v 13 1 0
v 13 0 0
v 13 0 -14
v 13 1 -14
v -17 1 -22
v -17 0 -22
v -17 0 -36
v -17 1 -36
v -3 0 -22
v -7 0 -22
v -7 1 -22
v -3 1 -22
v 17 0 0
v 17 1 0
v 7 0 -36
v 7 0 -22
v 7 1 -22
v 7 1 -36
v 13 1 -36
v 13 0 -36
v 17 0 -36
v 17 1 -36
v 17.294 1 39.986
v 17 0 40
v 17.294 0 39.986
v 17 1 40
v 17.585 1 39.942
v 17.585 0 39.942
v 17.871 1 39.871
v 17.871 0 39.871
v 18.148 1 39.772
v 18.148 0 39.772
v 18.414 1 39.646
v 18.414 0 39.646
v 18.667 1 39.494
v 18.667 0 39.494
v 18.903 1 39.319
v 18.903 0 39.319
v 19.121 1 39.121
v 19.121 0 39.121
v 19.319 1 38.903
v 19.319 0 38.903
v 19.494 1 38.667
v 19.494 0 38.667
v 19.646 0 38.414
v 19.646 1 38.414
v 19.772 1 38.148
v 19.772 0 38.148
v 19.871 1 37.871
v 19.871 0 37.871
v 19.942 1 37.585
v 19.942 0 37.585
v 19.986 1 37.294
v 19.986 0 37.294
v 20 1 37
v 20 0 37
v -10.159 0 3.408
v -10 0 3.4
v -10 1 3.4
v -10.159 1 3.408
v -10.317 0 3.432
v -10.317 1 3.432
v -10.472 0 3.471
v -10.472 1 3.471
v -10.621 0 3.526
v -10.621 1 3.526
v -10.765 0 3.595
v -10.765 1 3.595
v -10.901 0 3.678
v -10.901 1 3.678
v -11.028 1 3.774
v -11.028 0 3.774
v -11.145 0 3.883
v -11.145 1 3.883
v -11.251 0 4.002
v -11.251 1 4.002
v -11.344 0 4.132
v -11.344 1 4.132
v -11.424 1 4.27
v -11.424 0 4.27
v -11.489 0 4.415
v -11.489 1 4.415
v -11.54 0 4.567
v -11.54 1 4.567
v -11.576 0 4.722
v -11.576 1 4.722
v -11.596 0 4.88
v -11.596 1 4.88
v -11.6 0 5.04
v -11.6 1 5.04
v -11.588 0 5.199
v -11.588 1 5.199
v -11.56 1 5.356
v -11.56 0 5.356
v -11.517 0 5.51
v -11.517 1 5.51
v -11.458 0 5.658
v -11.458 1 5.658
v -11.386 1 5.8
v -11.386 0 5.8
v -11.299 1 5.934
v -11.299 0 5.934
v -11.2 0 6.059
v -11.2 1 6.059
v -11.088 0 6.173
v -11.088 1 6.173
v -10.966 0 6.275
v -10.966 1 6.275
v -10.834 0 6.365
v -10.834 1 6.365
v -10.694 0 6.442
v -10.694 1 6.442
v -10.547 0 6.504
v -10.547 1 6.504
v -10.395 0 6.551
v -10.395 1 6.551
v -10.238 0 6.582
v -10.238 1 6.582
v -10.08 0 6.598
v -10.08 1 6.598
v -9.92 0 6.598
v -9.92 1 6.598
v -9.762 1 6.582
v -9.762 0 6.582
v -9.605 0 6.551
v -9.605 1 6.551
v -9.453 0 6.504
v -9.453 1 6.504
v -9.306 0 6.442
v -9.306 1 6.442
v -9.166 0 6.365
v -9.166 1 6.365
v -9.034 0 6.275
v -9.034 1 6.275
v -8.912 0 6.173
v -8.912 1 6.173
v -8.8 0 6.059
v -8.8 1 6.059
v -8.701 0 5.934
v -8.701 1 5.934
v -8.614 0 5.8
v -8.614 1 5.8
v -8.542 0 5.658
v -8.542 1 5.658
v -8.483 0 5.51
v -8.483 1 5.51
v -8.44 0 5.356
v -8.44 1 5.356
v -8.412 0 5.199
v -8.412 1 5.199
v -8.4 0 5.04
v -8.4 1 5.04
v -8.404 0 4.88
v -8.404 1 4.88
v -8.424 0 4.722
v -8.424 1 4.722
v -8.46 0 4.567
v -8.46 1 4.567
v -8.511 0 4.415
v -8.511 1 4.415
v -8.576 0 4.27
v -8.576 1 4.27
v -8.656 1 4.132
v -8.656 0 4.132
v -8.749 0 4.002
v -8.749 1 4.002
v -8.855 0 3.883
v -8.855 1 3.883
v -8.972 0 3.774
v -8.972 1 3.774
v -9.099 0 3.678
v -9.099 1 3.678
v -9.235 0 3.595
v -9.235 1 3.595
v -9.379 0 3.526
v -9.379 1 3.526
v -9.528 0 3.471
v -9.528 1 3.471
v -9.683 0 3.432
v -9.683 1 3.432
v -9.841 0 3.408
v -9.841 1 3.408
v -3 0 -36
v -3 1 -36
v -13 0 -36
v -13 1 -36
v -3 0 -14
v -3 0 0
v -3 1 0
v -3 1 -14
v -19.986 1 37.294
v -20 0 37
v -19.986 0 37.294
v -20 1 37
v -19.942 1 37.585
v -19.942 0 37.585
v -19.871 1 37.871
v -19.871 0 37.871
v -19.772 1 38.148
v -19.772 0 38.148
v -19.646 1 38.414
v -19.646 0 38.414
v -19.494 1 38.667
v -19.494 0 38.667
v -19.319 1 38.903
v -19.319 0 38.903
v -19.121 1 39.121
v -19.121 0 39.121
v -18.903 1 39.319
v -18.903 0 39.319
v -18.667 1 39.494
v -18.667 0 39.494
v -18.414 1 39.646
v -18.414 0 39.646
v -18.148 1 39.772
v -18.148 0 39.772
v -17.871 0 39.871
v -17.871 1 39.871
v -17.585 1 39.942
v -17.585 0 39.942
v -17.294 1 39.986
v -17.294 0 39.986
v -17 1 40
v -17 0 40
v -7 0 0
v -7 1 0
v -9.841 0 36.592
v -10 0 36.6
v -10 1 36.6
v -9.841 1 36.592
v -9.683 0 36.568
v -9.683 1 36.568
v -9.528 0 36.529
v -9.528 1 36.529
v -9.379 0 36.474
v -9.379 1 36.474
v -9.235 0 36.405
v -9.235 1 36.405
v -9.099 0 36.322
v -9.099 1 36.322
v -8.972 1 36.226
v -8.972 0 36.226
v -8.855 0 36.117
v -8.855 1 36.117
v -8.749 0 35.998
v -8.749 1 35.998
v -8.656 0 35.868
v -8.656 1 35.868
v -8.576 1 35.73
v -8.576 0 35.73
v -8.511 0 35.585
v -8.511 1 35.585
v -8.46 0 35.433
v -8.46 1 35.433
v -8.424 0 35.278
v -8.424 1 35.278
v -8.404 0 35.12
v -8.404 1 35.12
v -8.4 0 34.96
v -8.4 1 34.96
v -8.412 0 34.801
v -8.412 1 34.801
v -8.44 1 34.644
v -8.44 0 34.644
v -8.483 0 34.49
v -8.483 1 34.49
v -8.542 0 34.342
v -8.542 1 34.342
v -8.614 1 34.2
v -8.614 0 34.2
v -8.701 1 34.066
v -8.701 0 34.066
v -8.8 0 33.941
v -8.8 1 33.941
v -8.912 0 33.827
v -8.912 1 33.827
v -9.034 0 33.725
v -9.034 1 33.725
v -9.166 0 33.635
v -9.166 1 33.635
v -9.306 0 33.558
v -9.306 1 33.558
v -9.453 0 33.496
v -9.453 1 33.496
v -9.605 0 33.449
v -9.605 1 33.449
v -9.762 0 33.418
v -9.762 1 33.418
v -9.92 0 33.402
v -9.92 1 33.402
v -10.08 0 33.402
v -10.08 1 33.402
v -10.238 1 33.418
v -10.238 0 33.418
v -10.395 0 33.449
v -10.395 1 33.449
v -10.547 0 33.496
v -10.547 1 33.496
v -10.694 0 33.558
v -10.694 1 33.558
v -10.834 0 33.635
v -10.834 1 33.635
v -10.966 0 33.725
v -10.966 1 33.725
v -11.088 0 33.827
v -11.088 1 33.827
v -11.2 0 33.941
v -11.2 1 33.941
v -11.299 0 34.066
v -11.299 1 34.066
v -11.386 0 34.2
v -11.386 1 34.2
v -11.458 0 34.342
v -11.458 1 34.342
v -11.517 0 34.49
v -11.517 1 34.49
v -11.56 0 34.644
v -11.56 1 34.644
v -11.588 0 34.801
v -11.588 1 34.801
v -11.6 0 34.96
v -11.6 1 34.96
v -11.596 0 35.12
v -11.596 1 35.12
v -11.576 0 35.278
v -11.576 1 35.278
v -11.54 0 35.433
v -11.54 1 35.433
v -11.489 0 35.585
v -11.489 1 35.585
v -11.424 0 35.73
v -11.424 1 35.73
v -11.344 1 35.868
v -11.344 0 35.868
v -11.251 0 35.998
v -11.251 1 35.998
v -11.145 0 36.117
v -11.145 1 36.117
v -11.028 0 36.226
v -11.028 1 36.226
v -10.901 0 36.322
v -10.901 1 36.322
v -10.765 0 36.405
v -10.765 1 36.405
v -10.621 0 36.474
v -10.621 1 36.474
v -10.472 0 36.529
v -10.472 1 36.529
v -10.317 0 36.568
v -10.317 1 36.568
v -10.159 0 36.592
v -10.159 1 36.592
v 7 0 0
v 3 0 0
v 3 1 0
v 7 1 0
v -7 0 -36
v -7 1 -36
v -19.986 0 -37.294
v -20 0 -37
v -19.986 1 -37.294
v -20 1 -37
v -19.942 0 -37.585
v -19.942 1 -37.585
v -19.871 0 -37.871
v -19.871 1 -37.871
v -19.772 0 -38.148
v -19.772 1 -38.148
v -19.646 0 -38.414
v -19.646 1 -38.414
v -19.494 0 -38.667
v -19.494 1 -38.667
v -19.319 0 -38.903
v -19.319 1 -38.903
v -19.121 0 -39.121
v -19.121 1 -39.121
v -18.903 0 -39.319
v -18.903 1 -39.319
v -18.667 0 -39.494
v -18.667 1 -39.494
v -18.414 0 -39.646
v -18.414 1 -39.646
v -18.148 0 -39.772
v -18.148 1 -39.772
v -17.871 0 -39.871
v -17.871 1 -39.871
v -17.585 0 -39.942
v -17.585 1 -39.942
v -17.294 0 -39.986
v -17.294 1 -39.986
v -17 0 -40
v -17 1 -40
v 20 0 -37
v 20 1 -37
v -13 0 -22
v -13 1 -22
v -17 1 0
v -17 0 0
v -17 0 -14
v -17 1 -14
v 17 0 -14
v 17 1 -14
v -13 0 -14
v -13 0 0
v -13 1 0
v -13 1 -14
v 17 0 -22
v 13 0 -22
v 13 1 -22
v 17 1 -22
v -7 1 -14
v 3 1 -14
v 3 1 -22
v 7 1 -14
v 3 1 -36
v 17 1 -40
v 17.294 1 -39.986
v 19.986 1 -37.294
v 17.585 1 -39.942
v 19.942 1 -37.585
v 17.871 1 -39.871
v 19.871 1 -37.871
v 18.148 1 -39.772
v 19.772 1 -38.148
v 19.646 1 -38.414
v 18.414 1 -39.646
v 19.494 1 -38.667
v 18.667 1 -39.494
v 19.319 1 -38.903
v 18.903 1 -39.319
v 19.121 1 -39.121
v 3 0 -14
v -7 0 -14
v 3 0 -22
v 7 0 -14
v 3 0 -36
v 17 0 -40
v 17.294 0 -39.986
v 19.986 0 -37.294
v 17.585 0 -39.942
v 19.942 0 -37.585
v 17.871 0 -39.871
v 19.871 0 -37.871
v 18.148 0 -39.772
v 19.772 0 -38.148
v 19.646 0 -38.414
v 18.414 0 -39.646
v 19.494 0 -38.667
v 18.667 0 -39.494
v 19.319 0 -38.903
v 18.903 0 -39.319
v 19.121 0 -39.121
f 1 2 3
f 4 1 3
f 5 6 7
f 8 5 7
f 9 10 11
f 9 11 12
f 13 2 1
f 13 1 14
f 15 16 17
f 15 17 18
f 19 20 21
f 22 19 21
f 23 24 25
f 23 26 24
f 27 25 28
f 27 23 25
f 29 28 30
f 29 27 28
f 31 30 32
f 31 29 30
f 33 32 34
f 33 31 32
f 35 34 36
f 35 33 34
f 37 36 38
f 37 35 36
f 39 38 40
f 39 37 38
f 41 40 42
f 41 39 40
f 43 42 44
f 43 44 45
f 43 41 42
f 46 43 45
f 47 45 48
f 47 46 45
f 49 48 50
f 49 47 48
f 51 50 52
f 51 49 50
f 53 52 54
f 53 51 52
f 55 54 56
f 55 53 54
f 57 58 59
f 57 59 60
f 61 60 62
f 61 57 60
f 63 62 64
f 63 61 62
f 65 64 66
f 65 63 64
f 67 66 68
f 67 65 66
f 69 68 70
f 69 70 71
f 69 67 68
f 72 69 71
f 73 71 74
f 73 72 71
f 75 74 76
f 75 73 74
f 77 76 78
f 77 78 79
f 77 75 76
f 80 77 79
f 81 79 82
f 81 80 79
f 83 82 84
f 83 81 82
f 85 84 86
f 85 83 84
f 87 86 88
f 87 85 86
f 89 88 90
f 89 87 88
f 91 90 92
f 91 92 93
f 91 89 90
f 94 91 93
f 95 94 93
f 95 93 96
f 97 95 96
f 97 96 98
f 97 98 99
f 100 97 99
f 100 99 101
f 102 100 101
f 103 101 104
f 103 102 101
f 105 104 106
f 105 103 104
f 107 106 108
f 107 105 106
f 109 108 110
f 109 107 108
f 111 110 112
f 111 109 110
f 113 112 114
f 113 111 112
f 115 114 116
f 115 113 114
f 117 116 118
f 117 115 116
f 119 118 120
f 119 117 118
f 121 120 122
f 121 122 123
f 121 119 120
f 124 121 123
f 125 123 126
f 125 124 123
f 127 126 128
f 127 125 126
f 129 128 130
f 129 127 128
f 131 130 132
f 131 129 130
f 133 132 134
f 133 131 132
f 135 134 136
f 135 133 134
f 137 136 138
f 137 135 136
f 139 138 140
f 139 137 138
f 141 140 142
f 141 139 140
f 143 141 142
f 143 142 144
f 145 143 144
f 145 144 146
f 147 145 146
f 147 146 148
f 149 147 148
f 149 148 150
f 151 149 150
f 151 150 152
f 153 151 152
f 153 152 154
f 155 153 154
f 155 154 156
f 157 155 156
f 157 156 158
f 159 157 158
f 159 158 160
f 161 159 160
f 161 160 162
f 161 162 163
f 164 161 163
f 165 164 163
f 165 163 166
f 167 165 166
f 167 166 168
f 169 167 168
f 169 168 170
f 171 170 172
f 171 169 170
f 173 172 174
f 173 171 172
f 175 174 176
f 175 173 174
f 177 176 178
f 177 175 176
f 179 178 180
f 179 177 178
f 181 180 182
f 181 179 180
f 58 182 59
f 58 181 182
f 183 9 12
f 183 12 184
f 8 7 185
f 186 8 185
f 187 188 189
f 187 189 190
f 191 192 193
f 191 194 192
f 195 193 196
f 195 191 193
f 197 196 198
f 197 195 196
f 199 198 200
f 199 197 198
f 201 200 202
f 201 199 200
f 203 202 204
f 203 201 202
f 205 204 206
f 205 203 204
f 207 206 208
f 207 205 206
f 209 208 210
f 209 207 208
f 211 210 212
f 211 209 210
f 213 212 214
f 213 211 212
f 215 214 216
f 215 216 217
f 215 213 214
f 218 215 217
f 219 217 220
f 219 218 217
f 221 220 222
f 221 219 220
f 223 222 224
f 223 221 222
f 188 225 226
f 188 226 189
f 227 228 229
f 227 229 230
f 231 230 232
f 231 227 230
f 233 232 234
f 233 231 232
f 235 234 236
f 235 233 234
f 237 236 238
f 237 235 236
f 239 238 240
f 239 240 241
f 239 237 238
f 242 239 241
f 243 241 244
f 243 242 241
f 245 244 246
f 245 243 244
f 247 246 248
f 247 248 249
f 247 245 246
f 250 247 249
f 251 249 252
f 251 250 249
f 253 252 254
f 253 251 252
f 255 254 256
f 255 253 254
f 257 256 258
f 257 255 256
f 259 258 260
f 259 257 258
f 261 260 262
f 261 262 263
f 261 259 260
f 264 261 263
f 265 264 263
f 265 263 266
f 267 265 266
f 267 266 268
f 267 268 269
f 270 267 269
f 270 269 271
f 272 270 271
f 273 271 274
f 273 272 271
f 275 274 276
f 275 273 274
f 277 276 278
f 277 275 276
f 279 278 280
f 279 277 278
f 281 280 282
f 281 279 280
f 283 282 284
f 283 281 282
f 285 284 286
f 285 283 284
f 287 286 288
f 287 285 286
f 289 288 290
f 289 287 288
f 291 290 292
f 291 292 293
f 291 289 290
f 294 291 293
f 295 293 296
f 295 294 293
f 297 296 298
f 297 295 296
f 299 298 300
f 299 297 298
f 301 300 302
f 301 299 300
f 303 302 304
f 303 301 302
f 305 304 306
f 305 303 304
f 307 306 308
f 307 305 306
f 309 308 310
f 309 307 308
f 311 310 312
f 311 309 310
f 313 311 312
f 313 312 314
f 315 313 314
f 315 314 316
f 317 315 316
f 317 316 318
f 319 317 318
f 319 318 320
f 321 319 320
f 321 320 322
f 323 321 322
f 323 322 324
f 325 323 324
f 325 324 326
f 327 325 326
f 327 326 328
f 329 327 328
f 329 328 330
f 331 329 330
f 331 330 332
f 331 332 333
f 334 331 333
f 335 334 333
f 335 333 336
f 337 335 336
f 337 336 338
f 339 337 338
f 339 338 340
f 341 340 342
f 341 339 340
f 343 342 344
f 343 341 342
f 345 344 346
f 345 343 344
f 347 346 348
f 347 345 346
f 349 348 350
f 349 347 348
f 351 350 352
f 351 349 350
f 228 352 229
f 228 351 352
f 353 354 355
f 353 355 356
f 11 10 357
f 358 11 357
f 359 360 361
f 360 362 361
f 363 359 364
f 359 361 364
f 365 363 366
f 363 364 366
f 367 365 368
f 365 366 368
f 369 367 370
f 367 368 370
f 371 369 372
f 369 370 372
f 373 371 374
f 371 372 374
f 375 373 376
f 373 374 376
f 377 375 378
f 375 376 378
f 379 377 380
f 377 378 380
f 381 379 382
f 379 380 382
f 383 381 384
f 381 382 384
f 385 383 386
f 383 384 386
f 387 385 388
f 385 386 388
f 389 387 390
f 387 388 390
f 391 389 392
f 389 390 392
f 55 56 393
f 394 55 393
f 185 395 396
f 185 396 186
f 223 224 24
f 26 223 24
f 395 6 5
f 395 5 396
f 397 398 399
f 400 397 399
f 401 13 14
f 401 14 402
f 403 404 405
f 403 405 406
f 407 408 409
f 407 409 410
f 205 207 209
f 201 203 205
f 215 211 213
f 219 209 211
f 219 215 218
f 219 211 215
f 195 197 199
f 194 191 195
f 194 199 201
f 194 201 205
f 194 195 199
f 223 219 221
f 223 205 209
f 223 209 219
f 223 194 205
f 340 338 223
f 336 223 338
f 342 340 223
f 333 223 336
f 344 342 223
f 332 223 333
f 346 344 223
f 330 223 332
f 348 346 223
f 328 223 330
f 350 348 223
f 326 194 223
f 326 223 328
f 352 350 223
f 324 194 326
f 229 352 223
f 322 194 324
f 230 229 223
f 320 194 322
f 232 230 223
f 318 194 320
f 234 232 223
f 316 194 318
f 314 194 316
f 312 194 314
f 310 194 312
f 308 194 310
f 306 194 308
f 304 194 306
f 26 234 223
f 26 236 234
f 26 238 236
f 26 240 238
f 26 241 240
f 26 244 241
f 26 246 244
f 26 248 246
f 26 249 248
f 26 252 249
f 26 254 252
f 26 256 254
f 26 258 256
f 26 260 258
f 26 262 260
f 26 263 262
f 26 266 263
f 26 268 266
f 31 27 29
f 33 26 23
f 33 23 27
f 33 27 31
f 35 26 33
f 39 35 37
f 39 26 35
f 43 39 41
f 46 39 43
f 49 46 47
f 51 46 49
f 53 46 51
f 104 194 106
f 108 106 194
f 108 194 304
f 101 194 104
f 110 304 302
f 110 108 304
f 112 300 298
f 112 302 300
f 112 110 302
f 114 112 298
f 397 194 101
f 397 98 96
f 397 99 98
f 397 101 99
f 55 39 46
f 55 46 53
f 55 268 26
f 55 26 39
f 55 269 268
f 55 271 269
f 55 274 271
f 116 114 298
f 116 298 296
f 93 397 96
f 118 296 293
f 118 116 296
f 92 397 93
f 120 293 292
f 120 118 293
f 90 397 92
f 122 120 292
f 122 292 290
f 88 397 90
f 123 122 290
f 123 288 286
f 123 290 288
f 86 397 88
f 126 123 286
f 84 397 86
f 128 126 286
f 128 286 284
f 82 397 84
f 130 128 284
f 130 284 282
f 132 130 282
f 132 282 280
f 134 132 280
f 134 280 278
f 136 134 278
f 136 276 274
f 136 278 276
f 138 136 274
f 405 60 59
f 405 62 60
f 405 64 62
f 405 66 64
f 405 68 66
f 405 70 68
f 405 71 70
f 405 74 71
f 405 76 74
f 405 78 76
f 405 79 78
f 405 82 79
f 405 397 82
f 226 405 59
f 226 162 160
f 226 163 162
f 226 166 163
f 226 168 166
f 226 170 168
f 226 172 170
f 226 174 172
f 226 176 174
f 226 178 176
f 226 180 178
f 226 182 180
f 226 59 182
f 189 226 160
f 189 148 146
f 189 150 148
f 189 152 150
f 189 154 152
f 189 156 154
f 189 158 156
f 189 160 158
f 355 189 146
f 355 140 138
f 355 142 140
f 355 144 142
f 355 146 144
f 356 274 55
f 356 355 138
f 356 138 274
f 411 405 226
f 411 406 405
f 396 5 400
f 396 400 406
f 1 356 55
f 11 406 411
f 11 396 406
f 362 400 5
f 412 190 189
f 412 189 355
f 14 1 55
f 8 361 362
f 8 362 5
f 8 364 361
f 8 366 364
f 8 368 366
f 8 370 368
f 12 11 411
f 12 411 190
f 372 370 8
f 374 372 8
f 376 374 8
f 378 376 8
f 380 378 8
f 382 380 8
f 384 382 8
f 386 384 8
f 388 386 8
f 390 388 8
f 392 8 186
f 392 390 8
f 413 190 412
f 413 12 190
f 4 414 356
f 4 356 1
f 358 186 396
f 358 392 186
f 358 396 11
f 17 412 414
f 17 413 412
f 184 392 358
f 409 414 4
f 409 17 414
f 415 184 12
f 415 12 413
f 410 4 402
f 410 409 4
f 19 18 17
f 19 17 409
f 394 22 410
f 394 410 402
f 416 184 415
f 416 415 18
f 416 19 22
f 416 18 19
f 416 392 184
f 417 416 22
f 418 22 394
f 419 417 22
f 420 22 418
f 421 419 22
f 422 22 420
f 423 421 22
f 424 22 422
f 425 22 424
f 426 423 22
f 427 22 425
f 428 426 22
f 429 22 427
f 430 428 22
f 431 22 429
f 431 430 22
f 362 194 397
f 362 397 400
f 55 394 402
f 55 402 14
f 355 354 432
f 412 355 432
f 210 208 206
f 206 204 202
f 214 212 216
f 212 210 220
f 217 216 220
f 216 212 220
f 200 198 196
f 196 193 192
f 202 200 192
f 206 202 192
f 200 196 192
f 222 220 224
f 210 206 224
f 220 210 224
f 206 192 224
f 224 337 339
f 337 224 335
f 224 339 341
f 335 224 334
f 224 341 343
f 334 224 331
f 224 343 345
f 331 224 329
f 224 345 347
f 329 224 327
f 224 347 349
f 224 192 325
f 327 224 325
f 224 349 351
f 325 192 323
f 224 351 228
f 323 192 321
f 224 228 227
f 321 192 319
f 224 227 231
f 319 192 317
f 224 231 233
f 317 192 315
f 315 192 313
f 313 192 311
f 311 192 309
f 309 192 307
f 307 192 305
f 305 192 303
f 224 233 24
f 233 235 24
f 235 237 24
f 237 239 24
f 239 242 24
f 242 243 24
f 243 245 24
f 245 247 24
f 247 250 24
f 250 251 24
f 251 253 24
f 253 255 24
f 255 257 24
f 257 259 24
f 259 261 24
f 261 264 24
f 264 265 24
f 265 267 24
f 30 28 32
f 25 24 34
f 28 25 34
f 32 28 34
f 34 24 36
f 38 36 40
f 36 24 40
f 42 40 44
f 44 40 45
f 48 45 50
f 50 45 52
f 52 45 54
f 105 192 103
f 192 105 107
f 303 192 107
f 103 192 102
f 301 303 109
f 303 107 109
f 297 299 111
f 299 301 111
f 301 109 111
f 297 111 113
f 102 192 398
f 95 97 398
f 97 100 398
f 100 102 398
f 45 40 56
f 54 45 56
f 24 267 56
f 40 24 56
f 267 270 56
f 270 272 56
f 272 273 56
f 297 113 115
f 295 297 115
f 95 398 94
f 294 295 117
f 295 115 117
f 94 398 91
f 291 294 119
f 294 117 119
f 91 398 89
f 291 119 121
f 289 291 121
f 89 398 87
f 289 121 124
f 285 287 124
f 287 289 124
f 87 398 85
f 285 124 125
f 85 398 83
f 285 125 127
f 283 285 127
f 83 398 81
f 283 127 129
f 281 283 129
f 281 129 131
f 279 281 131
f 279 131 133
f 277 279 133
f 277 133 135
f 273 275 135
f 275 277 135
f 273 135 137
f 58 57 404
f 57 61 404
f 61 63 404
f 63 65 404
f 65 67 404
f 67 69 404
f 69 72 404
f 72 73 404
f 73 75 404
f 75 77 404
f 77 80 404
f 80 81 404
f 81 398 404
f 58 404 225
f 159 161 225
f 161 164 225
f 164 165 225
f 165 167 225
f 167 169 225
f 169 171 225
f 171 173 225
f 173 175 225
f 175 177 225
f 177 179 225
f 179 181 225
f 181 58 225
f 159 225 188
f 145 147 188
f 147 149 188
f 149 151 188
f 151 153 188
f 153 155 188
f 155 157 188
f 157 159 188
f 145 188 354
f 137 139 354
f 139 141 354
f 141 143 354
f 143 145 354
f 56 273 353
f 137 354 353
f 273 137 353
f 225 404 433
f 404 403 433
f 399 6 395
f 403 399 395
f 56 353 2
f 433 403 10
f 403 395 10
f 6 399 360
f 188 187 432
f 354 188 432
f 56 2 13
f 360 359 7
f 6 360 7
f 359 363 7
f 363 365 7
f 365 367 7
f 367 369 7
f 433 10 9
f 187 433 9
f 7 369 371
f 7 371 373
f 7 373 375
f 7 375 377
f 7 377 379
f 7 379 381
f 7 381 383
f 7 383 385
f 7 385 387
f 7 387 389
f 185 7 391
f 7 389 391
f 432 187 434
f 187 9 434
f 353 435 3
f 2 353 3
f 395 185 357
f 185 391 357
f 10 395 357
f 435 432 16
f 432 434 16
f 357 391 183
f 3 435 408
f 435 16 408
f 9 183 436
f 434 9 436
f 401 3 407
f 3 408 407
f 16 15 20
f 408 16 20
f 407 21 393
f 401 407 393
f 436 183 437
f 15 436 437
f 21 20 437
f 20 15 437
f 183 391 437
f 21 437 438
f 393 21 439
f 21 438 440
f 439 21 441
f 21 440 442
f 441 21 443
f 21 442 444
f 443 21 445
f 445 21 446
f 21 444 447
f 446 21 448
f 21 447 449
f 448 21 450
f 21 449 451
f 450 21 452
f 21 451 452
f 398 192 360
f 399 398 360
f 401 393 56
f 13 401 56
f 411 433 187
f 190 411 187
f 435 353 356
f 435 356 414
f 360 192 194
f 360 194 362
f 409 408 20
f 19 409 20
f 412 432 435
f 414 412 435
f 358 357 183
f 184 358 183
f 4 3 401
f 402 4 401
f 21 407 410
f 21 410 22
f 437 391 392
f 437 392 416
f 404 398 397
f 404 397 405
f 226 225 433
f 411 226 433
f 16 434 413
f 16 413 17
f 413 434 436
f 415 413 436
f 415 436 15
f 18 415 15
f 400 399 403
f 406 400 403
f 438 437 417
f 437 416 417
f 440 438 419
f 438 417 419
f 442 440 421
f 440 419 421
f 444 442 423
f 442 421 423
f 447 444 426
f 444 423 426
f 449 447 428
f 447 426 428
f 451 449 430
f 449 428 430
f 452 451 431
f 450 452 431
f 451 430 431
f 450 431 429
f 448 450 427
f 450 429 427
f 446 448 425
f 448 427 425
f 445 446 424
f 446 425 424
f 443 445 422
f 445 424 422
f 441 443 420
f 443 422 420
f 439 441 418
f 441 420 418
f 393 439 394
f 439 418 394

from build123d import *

# Parameters (mm, degrees)
SKETCH_1_W      = 40
SKETCH_1_H      = 80
SKETCH_1_R      = 1.6
SKETCH_1_W_2    = 4
SKETCH_1_H_2    = 14
EXTRUDE_1_DEPTH = 1
FILLET_1_R      = 3


with BuildPart() as part:
    # 草图1 → 凸台-拉伸1 (new body)
    with BuildSketch(Plane(origin=(0, 0, 0), x_dir=(1, 0, 0), z_dir=(0, 1, 0))):
        Rectangle(SKETCH_1_W, SKETCH_1_H)
        with Locations(Location((-10, -35, 0), (0, 0, 270))):
            Circle(SKETCH_1_R, mode=Mode.SUBTRACT)
        with Locations(Location((-10, -5, 0), (0, 0, 90))):
            Circle(SKETCH_1_R, mode=Mode.SUBTRACT)
        with Locations((-5, 7)):
            Rectangle(SKETCH_1_W_2, SKETCH_1_H_2, mode=Mode.SUBTRACT)
        with Locations((-15, 7)):
            Rectangle(SKETCH_1_W_2, SKETCH_1_H_2, mode=Mode.SUBTRACT)
        with Locations((5, 7)):
            Rectangle(SKETCH_1_W_2, SKETCH_1_H_2, mode=Mode.SUBTRACT)
        with Locations((15, 7)):
            Rectangle(SKETCH_1_W_2, SKETCH_1_H_2, mode=Mode.SUBTRACT)
        with Locations((-5, 29)):
            Rectangle(SKETCH_1_W_2, SKETCH_1_H_2, mode=Mode.SUBTRACT)
        with Locations((5, 29)):
            Rectangle(SKETCH_1_W_2, SKETCH_1_H_2, mode=Mode.SUBTRACT)
        with Locations((15, 29)):
            Rectangle(SKETCH_1_W_2, SKETCH_1_H_2, mode=Mode.SUBTRACT)
        with Locations((-15, 29)):
            Rectangle(SKETCH_1_W_2, SKETCH_1_H_2, mode=Mode.SUBTRACT)
    extrude(amount=EXTRUDE_1_DEPTH)

    # 圆角1
    fillet_1_edges = [part.edges().sort_by_distance(p)[0] for p in [
        (20, 0.5, 40),
        (-20, 0.5, 40),
        (-20, 0.5, -40),
        (20, 0.5, -40),
    ]]
    fillet(fillet_1_edges, radius=FILLET_1_R)


solid = part.part
